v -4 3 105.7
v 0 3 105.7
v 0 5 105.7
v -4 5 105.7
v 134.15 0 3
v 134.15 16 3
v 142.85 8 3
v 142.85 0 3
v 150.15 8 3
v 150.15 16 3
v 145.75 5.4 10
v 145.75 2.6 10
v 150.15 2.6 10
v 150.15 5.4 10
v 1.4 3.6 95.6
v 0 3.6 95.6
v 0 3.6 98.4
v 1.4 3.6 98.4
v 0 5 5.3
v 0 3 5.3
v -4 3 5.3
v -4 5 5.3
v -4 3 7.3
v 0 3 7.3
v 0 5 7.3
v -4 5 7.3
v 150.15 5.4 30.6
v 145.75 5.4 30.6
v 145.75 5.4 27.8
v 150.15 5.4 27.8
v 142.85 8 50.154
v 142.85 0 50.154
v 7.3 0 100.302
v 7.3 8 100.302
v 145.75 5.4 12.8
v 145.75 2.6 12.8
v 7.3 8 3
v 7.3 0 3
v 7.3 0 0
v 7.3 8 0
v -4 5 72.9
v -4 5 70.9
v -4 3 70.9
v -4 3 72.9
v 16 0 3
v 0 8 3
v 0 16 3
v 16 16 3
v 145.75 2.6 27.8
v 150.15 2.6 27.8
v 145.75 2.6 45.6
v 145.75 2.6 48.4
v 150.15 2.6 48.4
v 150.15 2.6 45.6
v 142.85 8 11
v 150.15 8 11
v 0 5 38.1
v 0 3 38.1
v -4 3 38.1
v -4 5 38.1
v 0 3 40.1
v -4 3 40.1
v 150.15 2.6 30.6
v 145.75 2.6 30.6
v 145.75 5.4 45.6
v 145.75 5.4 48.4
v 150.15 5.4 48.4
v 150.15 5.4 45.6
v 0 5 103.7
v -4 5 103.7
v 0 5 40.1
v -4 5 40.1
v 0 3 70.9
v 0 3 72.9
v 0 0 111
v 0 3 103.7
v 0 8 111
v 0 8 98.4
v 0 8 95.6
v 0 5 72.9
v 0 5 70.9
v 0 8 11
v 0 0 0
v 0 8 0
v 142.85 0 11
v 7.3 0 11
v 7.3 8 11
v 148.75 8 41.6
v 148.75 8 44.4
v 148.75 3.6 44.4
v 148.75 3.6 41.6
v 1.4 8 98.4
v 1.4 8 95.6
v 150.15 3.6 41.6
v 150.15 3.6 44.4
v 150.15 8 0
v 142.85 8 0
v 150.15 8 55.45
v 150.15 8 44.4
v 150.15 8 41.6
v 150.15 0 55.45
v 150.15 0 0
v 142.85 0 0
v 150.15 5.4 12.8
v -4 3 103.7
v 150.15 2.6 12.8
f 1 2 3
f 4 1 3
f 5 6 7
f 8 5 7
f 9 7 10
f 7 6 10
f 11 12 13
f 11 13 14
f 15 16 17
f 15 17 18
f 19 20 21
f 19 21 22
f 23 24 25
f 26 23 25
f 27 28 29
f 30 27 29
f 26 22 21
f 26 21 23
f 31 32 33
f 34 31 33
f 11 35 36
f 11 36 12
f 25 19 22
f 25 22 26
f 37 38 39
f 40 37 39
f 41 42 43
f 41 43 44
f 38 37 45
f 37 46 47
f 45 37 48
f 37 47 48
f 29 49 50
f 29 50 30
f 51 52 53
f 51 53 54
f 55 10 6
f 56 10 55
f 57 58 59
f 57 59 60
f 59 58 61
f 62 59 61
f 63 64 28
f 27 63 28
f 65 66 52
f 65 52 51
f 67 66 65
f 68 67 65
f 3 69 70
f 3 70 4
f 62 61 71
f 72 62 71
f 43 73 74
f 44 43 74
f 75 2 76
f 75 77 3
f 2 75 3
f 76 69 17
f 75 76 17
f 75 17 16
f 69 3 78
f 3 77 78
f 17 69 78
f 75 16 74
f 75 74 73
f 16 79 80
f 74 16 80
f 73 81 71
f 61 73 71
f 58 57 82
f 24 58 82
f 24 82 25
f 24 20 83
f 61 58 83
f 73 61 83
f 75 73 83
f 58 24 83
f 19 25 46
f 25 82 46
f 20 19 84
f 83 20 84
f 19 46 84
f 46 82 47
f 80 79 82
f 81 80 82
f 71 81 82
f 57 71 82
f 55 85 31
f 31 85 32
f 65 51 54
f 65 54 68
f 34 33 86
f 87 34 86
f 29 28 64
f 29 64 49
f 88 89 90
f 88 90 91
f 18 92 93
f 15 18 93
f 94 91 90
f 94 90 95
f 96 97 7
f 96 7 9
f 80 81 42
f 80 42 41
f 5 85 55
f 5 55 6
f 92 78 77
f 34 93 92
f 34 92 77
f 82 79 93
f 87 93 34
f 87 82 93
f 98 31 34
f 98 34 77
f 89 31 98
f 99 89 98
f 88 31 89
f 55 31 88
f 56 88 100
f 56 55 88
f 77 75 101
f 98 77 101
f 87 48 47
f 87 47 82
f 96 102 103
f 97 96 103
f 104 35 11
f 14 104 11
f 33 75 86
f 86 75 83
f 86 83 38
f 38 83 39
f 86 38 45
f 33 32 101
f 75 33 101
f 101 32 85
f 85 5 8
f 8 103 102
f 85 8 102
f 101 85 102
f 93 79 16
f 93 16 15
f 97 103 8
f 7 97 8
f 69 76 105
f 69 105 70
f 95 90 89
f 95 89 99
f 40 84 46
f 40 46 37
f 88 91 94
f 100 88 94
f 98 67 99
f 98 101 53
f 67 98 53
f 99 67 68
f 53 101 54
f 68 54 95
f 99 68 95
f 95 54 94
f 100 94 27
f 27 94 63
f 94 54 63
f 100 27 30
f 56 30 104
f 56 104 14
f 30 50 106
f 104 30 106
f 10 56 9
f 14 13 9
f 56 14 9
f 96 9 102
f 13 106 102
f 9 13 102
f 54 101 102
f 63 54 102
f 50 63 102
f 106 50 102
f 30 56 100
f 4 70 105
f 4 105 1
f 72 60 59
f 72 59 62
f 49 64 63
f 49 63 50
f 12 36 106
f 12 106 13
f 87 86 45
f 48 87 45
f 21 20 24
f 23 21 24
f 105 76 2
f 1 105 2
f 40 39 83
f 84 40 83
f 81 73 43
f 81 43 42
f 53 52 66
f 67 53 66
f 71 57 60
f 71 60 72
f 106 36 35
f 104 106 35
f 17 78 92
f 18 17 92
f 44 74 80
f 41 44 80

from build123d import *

# Parameters (mm, degrees)
P_IDAT_VYSUNUT_M1_DEPTH  = 8
SKICA2_W                 = 1.4
SKICA2_H                 = 2.8
ODEBRAT_VYSUNUT_M1_DEPTH = 4.4
SKICA3_W                 = 2
SKICA3_H                 = 2
P_IDAT_VYSUNUT_M2_DEPTH  = 4
P_IDAT_START             = 8
SKICA5_W                 = 16
SKICA5_H                 = 8
P_IDAT_VYSUNUT_M3_DEPTH  = 16
ODEBRAT_VYSUNUT_M3_DEPTH = 191.628493411
ODEBRAT_VYSUNUT_M4_DEPTH = 188.40870444
SKICA4_W                 = 2.8
SKICA4_H                 = 2.8
ODEBRAT_VYSUNUT_M2_DEPTH = 4.4
SKICA8_W                 = 1.4
SKICA8_H                 = 2.8
ODEBRAT_VYSUNUT_M5_DEPTH = 4.4


with BuildPart() as part:
    # Skica1 → Přidat vysunutím1 (new body)
    with BuildSketch(Plane(origin=(0, 0, 0), x_dir=(1, 0, 0), z_dir=(0, 1, 0))):
        Polygon((0, 0), (0, -111), (150.15, -55.45), (150.15, 0), (142.85, 0), (142.85, -50.153914462), (7.3, -100.30244926), (7.3, 0), align=None)
    extrude(amount=P_IDAT_VYSUNUT_M1_DEPTH)

    # Skica2 → Odebrat vysunutím1 (cut)
    with BuildSketch(Plane(origin=(0, 8, 0), x_dir=(1, 0, 0), z_dir=(0, 1, 0))):
        with Locations((0.7, -97)):
            Rectangle(SKICA2_W, SKICA2_H)
    extrude(amount=-ODEBRAT_VYSUNUT_M1_DEPTH, mode=Mode.SUBTRACT)

    # Skica3 → Přidat vysunutím2 (add)
    with BuildSketch(Plane.ZY):
        with Locations((6.3, 4)):
            Rectangle(SKICA3_W, SKICA3_H)
        with Locations((39.1, 4)):
            Rectangle(SKICA3_W, SKICA3_H)
        with Locations((71.9, 4)):
            Rectangle(SKICA3_W, SKICA3_H)
        with Locations((104.7, 4)):
            Rectangle(SKICA3_W, SKICA3_H)
    extrude(amount=P_IDAT_VYSUNUT_M2_DEPTH)

    # Skica5 → Přidat vysunutím3 (add)
    with BuildSketch(Plane(origin=(0, 8, 0), x_dir=(1, 0, 0), z_dir=(0, 1, 0)).offset(P_IDAT_START)):
        with Locations((8, -7)):
            Rectangle(SKICA5_W, SKICA5_H)
        with Locations((142.15, -7)):
            Rectangle(SKICA5_W, SKICA5_H)
    extrude(amount=-P_IDAT_VYSUNUT_M3_DEPTH)

    # Skica6 → Odebrat vysunutím3 (cut, through all)
    with BuildSketch(Plane(origin=(150.15, 0, 0), x_dir=(0, 0, -1), z_dir=(1, 0, 0))):
        Polygon((-11, 8), (-11, 16), (-3, 16), align=None)
    extrude(amount=-ODEBRAT_VYSUNUT_M3_DEPTH, mode=Mode.SUBTRACT)

    # Skica7 → Odebrat vysunutím4 (cut, through all)
    with BuildSketch(Plane.XZ):
        Polygon((7.3, 11), (16, 3), (16, 11), align=None)
        Polygon((134.15, 3), (134.15, 11), (142.85, 11), align=None)
    extrude(amount=-ODEBRAT_VYSUNUT_M4_DEPTH, mode=Mode.SUBTRACT)

    # Skica4 → Odebrat vysunutím2 (cut)
    with BuildSketch(Plane(origin=(150.15, 0, 0), x_dir=(0, 0, -1), z_dir=(1, 0, 0))):
        with Locations((-47, 4)):
            Rectangle(SKICA4_W, SKICA4_H)
        with Locations((-29.2, 4)):
            Rectangle(SKICA4_W, SKICA4_H)
        with Locations((-11.4, 4)):
            Rectangle(SKICA4_W, SKICA4_H)
    extrude(amount=-ODEBRAT_VYSUNUT_M2_DEPTH, mode=Mode.SUBTRACT)

    # Skica8 → Odebrat vysunutím5 (cut)
    with BuildSketch(Plane(origin=(0, 8, 0), x_dir=(1, 0, 0), z_dir=(0, 1, 0))):
        with Locations((149.45, -43)):
            Rectangle(SKICA8_W, SKICA8_H)
    extrude(amount=-ODEBRAT_VYSUNUT_M5_DEPTH, mode=Mode.SUBTRACT)


solid = part.part
